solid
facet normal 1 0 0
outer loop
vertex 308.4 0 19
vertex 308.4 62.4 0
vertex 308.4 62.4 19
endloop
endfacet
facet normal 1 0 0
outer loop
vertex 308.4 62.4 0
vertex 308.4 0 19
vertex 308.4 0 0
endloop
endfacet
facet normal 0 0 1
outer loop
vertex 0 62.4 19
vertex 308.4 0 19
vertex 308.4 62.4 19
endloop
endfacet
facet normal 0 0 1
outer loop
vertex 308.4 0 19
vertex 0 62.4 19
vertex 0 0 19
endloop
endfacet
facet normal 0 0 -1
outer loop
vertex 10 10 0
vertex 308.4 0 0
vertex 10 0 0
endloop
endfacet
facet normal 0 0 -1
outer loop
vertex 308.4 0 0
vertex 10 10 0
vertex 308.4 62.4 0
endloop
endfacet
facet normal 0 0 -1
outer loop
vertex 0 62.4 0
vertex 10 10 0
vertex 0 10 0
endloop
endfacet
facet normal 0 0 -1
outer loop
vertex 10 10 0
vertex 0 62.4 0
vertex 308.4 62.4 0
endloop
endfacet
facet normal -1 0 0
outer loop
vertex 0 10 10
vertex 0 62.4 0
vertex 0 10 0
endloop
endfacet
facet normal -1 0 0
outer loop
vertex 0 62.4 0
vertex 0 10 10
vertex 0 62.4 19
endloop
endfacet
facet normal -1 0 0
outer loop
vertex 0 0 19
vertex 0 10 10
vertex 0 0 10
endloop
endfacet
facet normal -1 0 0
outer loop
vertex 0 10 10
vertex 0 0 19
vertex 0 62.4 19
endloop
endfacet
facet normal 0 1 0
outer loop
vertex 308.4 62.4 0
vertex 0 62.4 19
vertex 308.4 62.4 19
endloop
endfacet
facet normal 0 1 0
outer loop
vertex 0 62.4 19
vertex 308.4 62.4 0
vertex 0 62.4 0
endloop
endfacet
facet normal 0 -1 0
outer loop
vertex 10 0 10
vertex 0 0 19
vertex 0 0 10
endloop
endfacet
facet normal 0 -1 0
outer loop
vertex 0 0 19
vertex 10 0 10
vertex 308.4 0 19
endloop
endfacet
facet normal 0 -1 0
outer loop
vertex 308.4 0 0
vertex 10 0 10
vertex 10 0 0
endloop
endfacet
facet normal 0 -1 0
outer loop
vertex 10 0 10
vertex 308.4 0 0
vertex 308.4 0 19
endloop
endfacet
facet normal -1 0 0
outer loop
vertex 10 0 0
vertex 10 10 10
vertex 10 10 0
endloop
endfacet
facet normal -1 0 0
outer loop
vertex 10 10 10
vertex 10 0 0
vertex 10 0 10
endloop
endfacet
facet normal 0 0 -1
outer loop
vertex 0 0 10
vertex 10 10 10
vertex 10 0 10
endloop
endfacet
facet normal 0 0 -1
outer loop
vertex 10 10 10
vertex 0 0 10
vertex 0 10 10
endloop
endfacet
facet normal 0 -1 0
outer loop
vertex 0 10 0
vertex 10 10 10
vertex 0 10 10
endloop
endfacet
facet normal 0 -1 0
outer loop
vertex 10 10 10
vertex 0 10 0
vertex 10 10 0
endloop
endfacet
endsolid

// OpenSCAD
include <./config/token-config.scad>
// include <../../lib/tray/tile_tray_v3.scad>

$fn = 10;

// tile_tray_v3(matrix, matrix_counts, wall_inset_length);
